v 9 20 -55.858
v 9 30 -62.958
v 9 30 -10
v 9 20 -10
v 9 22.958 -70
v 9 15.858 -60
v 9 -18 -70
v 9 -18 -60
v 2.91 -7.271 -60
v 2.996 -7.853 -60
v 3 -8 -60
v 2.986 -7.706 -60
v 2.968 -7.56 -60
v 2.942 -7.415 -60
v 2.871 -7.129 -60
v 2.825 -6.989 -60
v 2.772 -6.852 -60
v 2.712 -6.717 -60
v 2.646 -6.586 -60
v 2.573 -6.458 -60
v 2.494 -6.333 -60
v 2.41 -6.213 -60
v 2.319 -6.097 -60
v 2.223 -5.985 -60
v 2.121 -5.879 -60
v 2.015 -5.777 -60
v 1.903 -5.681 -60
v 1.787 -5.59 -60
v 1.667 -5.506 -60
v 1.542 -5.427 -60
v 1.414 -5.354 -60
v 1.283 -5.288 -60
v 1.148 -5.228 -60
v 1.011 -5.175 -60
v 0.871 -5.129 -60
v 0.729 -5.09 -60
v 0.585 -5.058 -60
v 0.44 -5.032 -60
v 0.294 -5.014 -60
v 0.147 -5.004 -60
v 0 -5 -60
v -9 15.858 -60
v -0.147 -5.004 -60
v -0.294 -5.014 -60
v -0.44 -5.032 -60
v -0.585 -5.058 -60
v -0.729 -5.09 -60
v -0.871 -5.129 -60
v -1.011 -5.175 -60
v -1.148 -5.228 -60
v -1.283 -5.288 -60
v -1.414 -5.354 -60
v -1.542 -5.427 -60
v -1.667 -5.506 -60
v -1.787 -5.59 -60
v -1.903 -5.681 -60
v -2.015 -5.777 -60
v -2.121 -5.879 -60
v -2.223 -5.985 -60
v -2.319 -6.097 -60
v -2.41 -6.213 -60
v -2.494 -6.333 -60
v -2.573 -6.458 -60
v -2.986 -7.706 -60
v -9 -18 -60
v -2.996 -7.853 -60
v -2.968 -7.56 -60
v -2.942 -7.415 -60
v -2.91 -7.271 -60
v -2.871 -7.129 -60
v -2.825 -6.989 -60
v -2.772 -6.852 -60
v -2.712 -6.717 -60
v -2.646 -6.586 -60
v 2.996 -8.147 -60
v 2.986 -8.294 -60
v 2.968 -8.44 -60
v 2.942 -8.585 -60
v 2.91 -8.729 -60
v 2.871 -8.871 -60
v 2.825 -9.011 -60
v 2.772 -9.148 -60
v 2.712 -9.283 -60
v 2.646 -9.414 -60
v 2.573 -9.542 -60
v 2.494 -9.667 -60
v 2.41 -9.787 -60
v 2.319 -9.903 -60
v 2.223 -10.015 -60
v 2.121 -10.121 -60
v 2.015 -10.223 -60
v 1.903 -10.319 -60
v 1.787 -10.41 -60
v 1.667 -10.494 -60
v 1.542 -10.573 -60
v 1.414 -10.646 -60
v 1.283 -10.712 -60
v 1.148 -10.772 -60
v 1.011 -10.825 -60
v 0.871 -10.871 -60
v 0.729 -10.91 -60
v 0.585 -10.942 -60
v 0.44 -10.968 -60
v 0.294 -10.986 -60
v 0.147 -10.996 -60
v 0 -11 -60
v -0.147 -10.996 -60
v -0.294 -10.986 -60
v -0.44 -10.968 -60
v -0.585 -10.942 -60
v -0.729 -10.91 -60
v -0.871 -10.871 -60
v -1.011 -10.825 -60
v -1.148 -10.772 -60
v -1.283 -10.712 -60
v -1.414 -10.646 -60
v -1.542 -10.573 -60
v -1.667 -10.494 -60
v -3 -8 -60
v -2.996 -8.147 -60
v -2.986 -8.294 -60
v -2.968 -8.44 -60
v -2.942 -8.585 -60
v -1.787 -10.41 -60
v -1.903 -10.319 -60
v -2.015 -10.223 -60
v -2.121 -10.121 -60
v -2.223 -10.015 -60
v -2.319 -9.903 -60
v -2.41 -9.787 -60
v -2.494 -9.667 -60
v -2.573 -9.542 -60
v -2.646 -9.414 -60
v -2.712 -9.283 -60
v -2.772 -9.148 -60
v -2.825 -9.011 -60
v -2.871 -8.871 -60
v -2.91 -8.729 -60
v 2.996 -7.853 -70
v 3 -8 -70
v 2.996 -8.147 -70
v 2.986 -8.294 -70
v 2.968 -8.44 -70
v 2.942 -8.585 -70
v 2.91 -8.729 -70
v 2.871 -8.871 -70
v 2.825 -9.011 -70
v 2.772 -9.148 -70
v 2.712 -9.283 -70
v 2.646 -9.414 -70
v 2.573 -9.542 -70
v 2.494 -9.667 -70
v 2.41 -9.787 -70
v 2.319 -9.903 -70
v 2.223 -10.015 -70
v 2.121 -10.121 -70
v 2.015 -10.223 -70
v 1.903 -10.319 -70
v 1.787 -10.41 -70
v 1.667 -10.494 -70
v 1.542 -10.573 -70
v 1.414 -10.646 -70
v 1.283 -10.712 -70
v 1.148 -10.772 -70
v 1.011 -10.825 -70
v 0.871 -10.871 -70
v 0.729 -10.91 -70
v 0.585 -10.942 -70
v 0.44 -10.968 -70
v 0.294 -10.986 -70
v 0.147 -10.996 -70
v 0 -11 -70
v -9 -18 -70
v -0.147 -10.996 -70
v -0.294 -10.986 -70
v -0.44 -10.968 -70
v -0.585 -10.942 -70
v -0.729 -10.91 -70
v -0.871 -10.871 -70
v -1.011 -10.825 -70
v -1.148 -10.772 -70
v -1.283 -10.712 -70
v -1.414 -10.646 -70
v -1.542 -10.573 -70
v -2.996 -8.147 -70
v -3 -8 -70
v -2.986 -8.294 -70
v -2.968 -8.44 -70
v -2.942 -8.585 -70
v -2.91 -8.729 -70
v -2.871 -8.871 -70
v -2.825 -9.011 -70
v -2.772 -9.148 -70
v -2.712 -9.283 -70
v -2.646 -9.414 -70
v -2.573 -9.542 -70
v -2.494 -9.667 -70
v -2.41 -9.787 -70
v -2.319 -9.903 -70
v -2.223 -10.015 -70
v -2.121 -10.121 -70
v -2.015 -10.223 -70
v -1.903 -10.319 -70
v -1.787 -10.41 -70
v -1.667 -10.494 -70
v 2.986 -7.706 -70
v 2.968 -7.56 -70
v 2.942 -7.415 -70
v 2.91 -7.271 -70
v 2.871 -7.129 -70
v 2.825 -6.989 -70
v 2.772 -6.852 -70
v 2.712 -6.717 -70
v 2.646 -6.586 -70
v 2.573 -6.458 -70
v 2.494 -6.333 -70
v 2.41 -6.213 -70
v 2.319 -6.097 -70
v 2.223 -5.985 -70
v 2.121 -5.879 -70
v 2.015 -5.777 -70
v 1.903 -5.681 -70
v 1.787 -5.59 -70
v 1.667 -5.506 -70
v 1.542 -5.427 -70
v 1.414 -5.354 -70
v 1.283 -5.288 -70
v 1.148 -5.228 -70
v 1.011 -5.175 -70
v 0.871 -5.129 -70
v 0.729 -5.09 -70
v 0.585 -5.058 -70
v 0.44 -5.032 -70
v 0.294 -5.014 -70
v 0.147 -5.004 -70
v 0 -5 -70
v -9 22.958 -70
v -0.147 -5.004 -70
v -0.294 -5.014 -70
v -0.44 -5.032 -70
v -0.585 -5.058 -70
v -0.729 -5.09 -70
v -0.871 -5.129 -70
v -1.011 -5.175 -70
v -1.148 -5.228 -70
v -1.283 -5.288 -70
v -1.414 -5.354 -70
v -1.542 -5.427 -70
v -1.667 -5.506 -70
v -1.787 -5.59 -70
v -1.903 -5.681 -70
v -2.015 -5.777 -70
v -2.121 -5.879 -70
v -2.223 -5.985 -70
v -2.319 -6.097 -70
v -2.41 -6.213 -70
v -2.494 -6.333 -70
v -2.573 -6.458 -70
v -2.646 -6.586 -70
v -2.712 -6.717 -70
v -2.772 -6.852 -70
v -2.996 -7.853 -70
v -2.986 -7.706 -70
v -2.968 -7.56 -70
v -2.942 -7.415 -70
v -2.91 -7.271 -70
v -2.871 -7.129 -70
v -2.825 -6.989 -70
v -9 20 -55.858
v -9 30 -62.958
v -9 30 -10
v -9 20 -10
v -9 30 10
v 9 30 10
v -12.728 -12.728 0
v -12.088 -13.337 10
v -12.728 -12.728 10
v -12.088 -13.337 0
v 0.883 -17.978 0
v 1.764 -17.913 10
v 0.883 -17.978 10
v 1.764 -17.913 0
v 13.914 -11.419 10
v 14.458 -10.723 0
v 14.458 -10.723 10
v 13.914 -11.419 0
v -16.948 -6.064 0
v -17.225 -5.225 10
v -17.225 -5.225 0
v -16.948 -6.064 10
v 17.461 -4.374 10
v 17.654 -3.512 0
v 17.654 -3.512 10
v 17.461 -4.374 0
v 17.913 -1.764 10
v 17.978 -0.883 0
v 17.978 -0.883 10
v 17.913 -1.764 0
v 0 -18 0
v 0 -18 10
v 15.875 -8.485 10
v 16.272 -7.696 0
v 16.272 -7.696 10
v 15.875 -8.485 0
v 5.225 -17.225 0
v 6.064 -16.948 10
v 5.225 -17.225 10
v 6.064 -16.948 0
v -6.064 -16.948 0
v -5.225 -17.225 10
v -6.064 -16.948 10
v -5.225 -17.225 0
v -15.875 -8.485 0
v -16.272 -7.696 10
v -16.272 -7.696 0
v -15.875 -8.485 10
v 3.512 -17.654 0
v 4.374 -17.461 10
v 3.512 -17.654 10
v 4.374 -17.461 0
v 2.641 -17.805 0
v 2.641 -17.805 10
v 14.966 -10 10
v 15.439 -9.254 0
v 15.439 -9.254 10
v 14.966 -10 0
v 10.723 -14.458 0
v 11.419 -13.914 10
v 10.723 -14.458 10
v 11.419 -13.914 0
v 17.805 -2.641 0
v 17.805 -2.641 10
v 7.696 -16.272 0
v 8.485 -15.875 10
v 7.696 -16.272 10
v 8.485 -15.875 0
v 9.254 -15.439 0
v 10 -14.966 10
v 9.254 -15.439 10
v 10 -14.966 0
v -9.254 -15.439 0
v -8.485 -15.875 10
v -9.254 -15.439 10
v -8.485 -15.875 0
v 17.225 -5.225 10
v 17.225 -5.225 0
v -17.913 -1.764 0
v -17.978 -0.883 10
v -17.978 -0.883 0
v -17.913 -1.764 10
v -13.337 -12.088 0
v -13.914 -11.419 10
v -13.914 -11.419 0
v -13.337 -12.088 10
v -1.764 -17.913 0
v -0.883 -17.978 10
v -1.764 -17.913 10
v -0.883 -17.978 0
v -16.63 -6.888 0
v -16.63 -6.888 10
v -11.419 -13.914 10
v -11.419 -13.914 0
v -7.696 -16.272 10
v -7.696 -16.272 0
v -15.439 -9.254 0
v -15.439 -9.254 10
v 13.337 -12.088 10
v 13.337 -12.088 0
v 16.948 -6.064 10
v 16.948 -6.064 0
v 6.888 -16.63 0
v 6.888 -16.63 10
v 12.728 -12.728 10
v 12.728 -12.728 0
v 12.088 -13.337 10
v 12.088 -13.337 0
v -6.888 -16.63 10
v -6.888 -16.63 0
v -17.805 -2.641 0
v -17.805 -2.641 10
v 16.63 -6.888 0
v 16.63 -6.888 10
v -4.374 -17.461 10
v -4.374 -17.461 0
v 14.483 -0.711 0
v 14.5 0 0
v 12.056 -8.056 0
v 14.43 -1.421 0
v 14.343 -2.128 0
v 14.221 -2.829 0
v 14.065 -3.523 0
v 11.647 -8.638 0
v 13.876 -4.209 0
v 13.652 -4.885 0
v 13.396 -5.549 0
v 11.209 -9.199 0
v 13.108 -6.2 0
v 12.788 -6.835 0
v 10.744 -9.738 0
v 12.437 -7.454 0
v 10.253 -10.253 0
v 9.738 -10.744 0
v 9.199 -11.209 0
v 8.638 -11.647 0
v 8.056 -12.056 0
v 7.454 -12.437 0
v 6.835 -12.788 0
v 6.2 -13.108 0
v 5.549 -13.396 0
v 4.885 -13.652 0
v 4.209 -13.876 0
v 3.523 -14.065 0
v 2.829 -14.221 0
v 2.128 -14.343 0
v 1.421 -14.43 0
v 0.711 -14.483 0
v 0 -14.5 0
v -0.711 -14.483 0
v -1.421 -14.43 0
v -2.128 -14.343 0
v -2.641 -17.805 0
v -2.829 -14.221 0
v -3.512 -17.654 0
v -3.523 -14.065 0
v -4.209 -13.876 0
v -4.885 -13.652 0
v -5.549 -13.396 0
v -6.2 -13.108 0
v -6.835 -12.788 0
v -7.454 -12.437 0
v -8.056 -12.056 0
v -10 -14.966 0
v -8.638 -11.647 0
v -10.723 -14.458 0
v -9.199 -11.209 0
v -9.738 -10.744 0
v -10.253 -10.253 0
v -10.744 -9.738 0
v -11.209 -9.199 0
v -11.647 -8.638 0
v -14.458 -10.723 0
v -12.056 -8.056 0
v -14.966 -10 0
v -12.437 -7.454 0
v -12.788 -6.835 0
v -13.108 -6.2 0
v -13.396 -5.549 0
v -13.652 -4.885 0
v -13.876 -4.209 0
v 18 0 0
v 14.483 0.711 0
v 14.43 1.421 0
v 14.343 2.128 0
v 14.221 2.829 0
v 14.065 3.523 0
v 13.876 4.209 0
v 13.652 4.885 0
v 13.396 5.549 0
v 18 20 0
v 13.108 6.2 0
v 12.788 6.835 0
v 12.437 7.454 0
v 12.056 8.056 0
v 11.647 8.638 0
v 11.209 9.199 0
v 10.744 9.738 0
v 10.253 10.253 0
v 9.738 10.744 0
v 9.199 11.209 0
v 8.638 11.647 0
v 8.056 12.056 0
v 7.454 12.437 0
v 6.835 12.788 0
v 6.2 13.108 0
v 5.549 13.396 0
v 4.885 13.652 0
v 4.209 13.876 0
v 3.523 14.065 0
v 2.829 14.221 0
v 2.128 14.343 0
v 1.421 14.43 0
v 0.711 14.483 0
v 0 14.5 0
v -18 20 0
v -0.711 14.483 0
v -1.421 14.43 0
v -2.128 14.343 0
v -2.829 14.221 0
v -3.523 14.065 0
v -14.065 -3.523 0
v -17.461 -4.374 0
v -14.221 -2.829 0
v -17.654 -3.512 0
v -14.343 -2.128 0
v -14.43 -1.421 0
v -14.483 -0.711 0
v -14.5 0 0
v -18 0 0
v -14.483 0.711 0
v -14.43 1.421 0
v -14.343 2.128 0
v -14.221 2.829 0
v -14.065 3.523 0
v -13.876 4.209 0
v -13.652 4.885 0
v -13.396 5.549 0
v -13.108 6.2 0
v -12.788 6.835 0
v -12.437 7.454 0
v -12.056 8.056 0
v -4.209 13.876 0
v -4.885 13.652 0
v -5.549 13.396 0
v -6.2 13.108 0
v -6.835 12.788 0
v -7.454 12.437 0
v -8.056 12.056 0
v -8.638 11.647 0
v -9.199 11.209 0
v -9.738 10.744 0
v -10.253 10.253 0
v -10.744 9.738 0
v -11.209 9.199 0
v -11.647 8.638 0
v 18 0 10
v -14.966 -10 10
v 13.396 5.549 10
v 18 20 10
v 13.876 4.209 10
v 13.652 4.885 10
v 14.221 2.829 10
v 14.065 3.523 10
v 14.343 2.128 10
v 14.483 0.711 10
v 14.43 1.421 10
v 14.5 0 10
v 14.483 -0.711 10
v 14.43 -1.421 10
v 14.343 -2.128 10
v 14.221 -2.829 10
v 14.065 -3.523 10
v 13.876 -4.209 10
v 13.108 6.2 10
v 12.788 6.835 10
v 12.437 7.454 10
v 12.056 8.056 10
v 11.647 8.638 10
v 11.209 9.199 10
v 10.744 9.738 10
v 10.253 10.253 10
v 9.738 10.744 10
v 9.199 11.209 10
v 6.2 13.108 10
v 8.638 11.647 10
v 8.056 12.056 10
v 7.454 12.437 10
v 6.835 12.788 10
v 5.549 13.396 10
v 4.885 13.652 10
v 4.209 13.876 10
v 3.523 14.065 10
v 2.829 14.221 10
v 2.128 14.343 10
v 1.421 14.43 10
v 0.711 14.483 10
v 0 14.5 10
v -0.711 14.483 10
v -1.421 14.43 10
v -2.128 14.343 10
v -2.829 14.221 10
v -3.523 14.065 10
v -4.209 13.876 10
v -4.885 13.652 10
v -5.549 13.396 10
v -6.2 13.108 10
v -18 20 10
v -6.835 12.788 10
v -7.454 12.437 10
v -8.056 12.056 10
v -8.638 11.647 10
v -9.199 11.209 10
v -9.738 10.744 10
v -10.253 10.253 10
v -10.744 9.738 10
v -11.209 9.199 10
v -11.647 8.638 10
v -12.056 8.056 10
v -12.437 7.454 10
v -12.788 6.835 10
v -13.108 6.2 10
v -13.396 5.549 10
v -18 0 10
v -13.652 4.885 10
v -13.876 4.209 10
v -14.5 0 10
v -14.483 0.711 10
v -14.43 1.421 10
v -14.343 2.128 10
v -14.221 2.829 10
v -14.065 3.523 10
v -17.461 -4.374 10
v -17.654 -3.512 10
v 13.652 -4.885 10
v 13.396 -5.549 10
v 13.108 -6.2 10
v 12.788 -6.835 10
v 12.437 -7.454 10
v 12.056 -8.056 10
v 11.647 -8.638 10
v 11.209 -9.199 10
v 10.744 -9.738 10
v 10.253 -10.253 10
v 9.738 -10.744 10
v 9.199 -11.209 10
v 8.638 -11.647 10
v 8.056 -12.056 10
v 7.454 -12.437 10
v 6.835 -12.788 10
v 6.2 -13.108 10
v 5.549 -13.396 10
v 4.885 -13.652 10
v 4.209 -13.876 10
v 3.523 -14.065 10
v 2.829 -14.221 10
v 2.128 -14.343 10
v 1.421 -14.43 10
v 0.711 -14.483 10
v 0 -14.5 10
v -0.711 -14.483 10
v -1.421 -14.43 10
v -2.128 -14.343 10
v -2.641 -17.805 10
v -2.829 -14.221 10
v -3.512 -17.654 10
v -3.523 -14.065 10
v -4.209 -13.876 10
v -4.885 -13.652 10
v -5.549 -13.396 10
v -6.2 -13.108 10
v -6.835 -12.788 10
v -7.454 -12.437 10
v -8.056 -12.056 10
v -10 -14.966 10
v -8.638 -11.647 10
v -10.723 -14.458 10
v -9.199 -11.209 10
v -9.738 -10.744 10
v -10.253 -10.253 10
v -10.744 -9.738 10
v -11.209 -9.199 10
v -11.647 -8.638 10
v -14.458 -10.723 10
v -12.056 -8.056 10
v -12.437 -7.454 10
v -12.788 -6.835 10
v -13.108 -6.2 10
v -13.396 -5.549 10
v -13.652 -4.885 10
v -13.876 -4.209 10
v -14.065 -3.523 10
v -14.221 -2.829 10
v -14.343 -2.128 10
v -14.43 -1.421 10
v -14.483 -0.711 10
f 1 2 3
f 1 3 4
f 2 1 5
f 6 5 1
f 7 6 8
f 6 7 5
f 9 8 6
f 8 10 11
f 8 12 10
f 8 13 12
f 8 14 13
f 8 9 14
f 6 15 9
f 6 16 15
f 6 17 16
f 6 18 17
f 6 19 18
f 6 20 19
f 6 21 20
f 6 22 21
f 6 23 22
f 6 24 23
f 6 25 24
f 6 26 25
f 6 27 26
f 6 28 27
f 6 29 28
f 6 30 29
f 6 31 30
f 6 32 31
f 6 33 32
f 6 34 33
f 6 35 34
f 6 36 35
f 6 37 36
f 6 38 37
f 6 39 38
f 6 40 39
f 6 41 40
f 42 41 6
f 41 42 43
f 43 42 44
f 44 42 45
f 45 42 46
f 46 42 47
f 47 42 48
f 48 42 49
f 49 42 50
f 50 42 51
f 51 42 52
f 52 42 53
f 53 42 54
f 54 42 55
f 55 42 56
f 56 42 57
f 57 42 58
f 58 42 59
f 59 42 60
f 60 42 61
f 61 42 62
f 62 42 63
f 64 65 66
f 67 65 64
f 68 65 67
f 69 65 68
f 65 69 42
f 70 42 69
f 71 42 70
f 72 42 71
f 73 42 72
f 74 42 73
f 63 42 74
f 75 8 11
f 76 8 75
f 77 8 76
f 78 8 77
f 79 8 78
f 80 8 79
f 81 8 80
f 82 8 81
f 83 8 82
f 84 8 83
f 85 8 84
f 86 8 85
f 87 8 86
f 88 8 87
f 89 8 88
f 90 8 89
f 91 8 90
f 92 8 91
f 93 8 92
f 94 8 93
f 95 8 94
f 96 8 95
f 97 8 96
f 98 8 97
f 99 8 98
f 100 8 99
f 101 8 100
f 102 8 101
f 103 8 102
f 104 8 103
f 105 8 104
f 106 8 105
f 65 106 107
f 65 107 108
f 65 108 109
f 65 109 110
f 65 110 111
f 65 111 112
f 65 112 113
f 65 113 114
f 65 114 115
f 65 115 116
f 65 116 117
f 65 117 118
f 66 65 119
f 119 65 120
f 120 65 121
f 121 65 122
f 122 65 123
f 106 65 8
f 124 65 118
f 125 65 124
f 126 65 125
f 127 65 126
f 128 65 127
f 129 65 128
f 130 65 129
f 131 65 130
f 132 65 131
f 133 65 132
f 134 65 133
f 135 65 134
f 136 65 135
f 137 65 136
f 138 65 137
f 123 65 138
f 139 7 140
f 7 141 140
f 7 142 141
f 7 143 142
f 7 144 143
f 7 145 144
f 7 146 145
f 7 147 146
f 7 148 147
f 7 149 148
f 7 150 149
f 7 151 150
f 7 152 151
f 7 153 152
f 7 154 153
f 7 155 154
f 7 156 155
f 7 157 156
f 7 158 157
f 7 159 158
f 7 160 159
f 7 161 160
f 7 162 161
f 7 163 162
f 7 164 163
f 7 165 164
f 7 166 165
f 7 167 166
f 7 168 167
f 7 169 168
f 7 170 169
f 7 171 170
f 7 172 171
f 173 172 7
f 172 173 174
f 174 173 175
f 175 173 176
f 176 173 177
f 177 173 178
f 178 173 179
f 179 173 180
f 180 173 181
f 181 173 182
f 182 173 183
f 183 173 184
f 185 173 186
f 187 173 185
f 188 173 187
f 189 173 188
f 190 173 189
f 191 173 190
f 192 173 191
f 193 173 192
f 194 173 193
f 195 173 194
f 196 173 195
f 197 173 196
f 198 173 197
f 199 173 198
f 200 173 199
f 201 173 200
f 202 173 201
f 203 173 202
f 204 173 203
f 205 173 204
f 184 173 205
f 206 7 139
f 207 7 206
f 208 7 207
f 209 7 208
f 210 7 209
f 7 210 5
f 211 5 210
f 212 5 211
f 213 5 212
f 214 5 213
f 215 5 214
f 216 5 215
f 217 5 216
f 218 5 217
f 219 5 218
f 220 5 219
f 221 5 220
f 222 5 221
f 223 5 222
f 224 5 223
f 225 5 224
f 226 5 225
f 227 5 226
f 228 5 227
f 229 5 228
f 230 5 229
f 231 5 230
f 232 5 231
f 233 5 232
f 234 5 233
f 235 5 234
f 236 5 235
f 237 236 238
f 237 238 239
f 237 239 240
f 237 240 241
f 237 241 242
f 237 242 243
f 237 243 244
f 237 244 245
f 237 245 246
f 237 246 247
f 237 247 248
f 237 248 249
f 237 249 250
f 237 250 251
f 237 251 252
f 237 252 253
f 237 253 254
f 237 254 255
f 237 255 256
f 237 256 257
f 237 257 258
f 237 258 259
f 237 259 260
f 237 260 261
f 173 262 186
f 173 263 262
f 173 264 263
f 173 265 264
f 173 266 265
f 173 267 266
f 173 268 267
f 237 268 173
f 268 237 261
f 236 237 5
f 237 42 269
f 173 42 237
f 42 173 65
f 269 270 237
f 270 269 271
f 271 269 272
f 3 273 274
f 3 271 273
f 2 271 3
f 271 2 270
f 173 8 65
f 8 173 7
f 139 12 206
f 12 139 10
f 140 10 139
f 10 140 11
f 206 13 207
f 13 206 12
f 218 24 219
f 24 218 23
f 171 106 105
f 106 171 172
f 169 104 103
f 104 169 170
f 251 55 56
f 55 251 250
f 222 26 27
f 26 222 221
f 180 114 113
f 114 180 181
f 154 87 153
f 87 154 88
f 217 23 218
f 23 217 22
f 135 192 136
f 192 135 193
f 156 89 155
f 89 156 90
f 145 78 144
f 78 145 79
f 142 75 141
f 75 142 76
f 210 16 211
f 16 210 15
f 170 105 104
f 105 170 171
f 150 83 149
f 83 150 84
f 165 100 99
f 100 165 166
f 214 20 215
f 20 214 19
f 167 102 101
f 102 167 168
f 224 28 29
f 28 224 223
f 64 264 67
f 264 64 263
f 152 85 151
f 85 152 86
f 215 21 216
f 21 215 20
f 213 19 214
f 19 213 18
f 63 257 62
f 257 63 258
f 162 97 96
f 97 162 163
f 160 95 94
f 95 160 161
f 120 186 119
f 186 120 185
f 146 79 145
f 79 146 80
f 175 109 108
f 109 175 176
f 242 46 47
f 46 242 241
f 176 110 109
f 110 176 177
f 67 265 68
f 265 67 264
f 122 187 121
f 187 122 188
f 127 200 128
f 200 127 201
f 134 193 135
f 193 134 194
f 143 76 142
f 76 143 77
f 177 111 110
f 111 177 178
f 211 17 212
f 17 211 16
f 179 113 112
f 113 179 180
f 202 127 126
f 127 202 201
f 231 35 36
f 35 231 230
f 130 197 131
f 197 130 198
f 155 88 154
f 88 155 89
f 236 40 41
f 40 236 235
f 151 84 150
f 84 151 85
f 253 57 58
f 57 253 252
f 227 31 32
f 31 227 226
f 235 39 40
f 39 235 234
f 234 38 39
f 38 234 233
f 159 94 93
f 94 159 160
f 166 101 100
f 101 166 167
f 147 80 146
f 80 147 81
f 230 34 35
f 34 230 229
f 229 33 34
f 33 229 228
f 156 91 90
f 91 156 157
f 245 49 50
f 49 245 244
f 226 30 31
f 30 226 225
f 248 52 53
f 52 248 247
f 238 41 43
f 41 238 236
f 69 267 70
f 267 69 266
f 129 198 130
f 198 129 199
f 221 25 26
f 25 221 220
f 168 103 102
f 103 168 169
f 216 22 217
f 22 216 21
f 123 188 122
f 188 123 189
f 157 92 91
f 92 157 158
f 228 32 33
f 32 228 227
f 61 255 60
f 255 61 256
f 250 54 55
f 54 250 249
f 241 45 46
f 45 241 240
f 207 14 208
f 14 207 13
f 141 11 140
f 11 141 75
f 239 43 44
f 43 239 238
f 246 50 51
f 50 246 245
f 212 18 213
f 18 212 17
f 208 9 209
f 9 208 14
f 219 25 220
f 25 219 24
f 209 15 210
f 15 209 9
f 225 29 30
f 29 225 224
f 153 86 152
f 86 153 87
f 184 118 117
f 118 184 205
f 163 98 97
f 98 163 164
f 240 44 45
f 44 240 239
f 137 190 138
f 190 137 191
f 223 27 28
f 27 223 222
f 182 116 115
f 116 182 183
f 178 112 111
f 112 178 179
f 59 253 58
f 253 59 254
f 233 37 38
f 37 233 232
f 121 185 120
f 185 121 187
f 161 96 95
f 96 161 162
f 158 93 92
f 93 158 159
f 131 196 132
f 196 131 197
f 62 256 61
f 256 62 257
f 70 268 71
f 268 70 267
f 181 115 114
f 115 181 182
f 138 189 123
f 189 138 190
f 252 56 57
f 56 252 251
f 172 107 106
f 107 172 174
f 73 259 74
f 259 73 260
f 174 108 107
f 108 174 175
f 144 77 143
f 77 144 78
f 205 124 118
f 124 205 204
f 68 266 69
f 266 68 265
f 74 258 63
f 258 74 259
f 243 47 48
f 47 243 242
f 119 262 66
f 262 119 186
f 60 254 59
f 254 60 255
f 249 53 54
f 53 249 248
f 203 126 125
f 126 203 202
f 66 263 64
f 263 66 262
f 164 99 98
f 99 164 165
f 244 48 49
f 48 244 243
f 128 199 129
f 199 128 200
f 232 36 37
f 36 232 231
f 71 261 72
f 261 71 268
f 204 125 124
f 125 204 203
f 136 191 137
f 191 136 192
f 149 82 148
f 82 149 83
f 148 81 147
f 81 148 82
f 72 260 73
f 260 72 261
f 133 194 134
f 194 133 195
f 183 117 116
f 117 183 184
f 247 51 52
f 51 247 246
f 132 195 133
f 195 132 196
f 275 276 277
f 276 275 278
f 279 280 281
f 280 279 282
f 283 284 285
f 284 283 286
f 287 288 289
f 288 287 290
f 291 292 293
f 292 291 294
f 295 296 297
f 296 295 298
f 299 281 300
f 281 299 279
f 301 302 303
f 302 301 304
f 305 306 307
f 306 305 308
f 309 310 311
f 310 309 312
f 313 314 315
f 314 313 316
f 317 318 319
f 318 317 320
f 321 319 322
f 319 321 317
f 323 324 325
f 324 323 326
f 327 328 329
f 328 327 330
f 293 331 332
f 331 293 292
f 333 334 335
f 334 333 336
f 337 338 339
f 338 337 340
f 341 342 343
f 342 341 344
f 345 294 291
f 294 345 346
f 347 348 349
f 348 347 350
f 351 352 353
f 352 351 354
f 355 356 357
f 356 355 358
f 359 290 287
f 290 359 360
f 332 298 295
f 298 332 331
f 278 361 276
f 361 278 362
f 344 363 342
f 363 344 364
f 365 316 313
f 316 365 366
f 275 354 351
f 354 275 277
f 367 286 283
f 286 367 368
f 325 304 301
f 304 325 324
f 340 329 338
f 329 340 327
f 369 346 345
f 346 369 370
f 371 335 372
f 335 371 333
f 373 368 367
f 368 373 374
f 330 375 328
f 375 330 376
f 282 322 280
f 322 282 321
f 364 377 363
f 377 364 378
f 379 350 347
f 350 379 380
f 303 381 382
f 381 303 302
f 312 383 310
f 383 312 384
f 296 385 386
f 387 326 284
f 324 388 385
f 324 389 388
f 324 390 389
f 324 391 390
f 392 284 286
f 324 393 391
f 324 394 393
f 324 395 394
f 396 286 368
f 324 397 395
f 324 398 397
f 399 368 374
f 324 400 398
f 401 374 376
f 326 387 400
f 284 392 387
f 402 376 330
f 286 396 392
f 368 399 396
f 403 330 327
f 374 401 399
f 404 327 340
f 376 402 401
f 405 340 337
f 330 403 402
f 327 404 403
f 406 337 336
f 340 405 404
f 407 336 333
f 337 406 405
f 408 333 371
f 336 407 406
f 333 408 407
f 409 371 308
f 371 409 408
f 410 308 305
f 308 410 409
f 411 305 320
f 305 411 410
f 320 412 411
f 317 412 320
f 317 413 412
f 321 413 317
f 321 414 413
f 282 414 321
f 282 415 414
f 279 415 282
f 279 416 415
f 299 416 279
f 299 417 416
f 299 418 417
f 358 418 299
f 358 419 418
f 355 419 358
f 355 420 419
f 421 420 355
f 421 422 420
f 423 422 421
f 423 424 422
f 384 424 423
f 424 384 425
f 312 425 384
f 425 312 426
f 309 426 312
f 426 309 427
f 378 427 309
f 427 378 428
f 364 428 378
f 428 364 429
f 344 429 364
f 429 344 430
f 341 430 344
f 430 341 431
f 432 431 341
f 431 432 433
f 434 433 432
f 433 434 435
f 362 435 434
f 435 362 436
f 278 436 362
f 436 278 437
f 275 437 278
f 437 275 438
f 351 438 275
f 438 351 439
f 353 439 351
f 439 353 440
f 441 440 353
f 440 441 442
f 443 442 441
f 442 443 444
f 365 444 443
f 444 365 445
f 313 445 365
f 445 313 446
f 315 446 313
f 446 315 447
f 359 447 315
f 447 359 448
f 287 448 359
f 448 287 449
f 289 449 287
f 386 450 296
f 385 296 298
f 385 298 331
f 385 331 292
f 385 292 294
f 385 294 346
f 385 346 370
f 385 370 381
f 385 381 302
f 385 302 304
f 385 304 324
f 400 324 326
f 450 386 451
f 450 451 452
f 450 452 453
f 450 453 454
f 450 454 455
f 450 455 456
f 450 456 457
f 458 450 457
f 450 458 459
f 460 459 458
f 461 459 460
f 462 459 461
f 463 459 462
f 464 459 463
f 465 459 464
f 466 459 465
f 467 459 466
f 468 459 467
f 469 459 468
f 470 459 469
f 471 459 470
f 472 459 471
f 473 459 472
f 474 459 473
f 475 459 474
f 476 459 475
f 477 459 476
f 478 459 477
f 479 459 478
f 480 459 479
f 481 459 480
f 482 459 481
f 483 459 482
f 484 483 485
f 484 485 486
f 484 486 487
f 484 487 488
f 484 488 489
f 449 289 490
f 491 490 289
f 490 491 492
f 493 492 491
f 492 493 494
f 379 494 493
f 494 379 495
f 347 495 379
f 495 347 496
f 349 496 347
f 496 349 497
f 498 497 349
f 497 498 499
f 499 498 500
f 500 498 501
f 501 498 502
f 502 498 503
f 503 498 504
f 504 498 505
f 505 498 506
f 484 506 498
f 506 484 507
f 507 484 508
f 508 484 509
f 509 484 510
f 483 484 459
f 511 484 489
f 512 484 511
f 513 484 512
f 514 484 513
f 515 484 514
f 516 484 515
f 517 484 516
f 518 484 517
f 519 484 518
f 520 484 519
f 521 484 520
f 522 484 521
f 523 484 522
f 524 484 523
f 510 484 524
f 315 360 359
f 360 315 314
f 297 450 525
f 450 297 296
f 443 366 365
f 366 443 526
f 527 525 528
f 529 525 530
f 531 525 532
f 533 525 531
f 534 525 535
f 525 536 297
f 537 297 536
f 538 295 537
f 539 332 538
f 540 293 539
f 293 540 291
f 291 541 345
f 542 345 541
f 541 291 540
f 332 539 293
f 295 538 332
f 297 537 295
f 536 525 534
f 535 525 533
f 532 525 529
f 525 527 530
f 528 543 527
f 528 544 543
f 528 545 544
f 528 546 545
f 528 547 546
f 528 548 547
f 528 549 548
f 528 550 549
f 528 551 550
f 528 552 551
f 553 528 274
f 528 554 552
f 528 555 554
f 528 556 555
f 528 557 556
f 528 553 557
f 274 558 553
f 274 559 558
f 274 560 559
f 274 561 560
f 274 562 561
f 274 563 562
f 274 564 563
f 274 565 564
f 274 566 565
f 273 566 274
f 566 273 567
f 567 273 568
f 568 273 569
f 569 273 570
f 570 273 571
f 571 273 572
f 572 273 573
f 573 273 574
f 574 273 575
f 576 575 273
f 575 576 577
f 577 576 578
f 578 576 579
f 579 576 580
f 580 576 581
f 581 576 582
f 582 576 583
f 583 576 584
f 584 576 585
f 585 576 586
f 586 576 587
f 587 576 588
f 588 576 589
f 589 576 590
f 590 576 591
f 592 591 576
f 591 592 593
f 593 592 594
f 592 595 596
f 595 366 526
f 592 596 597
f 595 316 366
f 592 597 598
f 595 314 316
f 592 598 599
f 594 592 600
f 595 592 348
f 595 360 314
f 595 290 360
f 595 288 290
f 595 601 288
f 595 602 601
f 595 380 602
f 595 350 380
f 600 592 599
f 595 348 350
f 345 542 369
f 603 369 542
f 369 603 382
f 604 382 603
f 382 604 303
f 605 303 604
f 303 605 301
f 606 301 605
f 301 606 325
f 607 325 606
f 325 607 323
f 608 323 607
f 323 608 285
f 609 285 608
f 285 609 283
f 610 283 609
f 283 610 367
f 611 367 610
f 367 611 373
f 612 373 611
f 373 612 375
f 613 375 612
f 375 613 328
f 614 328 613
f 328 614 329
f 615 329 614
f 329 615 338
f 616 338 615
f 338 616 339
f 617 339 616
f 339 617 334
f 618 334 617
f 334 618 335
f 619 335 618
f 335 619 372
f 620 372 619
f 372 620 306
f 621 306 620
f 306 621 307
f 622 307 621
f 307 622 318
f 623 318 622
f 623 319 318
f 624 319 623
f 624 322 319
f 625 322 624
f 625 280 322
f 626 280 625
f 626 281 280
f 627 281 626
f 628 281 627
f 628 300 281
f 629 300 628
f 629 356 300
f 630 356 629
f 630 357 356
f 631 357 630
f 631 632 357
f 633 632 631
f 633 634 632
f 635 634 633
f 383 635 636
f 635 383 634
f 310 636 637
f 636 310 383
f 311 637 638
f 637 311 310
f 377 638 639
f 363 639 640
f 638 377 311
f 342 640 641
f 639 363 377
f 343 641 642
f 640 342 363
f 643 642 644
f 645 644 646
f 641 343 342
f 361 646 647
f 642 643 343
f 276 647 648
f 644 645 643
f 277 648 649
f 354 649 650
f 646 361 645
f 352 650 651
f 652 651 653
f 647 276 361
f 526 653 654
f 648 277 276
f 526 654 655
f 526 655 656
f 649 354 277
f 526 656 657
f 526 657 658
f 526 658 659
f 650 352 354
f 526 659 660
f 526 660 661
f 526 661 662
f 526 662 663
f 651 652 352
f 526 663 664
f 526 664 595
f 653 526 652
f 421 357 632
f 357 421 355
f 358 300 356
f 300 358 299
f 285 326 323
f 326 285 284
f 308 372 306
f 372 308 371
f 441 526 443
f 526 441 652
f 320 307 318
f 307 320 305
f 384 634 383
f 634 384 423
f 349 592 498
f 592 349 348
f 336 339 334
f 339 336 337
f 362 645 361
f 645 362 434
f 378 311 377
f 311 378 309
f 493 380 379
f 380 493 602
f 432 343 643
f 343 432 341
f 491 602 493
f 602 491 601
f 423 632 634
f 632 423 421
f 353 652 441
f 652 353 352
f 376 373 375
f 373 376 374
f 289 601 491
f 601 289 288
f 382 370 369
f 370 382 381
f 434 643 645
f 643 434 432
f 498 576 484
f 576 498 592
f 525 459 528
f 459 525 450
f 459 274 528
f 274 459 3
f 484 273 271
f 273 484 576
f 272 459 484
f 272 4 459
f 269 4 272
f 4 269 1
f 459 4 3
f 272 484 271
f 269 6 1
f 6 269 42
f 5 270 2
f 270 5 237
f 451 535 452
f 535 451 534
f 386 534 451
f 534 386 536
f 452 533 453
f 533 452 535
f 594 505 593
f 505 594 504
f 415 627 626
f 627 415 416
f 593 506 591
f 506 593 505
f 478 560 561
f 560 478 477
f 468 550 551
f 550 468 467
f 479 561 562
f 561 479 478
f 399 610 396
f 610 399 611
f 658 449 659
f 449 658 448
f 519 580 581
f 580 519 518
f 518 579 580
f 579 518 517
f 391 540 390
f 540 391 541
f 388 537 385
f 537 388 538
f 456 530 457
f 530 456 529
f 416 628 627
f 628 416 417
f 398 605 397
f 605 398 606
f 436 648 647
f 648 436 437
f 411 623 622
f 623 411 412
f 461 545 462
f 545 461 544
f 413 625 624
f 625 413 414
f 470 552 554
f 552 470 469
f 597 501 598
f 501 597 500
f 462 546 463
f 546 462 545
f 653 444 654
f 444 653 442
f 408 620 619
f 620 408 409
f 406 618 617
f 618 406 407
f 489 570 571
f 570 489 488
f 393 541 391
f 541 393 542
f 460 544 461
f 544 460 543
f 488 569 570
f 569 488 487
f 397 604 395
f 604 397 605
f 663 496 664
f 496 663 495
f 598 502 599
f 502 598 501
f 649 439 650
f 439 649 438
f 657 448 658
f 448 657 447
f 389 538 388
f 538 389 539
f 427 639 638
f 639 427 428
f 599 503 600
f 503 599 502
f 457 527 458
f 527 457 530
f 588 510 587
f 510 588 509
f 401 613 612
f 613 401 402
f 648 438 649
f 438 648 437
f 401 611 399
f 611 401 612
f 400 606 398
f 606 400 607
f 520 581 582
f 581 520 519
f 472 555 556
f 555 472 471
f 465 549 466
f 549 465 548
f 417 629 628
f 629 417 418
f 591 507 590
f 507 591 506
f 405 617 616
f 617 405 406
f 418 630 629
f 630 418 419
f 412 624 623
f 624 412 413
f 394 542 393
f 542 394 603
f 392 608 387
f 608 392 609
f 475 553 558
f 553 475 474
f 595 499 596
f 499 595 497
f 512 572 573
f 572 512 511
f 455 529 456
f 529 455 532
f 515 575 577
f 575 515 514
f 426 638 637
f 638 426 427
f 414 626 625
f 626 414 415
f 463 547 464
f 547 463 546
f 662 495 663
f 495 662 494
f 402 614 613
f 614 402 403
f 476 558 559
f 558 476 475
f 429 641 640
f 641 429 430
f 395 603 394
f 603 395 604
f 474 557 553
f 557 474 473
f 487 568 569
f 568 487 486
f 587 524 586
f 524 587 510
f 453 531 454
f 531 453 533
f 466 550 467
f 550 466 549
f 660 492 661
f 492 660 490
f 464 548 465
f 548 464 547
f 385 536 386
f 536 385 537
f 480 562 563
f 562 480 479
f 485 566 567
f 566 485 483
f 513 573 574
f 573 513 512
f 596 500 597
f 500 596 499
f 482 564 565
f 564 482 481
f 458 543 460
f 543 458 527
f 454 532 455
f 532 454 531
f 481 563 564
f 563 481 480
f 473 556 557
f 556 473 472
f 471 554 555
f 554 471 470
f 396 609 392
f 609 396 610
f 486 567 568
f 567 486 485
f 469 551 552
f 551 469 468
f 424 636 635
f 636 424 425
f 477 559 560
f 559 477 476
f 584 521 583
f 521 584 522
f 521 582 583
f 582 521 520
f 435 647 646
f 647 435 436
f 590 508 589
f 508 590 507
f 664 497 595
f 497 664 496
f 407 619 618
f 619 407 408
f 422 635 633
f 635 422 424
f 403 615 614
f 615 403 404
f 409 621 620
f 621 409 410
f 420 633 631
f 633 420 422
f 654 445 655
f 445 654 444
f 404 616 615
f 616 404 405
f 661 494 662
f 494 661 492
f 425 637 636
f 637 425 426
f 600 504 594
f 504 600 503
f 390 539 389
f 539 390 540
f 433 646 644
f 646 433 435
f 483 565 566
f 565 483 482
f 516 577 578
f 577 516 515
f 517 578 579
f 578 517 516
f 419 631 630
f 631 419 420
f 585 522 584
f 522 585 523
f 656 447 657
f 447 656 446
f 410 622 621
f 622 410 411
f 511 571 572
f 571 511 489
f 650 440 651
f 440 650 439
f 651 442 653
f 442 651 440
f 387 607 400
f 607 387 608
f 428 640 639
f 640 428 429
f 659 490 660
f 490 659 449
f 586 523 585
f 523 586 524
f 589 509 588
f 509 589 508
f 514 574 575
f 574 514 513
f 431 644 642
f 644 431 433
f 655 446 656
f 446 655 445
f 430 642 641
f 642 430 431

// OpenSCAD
// Generated by SolidPython 1.1.3 on 2024-03-23 22:13:12
$fn = 128;


difference(){
	difference() {
		union() {
			difference() {
				cylinder(h = 10, r = 18.0000000000);
			}
			hull() {
				translate(v = [-18.0000000000, 0, 0]) {
					cube(size = [36, 20.0000000000, 10]);
				}
				hull() {
					translate(v = [0, 0, 0]) {
						translate(v = [0, 20.0000000000, 0]) {
							translate(v = [-9.0000000000, 0, 0]) {
								cube(size = [18.0000000000, 10, 10]);
							}
						}
					}
				}
			}
			translate(v = [0, 0, -60]) {
				translate(v = [0, 20.0000000000, 0]) {
					translate(v = [-9.0000000000, 0, 0]) {
						cube(size = [18.0000000000, 10, 70]);
					}
				}
			}
			translate(v = [0, -18, 0]) {
				translate(v = [-9.0000000000, 0, 0]) {
					translate(v = [0, 0, -70]) {
						difference() {
							cube(size = [18.0000000000, 48, 10]);
							translate(v = [0, 10, 0]) {
								translate(v = [9.0000000000, 0, 0]) {
									cylinder(h = 10, r = 3);
								}
							}
						}
					}
				}
			}
			hull() {
				intersection() {
					translate(v = [-18.0000000000, 0, 0]) {
						translate(v = [0, 20.0000000000, 0]) {
							cube(size = [36, 10, 10]);
						}
					}
					union() {
						difference() {
							cylinder(h = 10, r = 18.0000000000);
						}
						hull() {
							translate(v = [-18.0000000000, 0, 0]) {
								cube(size = [36, 20.0000000000, 10]);
							}
							hull() {
								translate(v = [0, 0, 0]) {
									translate(v = [0, 20.0000000000, 0]) {
										translate(v = [-9.0000000000, 0, 0]) {
											cube(size = [18.0000000000, 10, 10]);
										}
									}
								}
							}
						}
						translate(v = [0, 0, -60]) {
							translate(v = [0, 20.0000000000, 0]) {
								translate(v = [-9.0000000000, 0, 0]) {
									cube(size = [18.0000000000, 10, 70]);
								}
							}
						}
						translate(v = [0, -18, 0]) {
							translate(v = [-9.0000000000, 0, 0]) {
								translate(v = [0, 0, -70]) {
									difference() {
										cube(size = [18.0000000000, 48, 10]);
										translate(v = [0, 10, 0]) {
											translate(v = [9.0000000000, 0, 0]) {
												cylinder(h = 10, r = 3);
											}
										}
									}
								}
							}
						}
					}
				}
				translate(v = [0, 0, -10]) {
					translate(v = [0, 0, 0]) {
						translate(v = [0, 20.0000000000, 0]) {
							translate(v = [-9.0000000000, 0, 0]) {
								cube(size = [18.0000000000, 10, 10]);
							}
						}
					}
				}
			}
			translate(v = [0, 20, 0]) {
				translate(v = [-9, 0, 0]) {
					translate(v = [0, 0, -70]) {
						rotate(a = 45, v = [1, 0, 0]) {
							cube(size = [18, 10, 10]);
						}
					}
				}
			}
		}
		translate(v = [0, 30, 0]) {
			translate(v = [-9, 0, 0]) {
				translate(v = [0, 0, -77.1000000000]) {
					rotate(a = 45, v = [1, 0, 0]) {
						cube(size = [30, 10, 10]);
					}
				}
			}
		}
	}
	/* Holes Below*/
	union(){
		union(){
			union(){
				cylinder(h = 10, r = 14.5000000000);
			}
			hull(){
				union(){
					union(){
						union(){
							cylinder(h = 10, r = 14.5000000000);
						}
					}
				}
			}
		}
	} /* End Holes */ 
}
/***********************************************
*********      SolidPython code:      **********
************************************************
 
from dataclasses import dataclass

from solid import cylinder, scad_render_to_file, hole, cube, rotate, translate, hull, sphere, mirror, square, intersection
from solid.utils import left, right, forward, back, up, down, BACK_VEC, FORWARD_VEC, fillet_2d


@dataclass
class Ring:
    innerd: int = 29
    thick: int = 5
    height: int = 10

    @property
    def outerd(self):
        return self.innerd + self.thick

    def obj(self):
        outer = cylinder(r=self.outerd/2, h=self.height)
        inner = cylinder(r=self.innerd/2, h=self.height)
        return outer - hole()(inner)


@dataclass
class UpperBody:
    clearance: int = 2
    thick: int = 10
    width: int = 34

    @property
    def length(self):
        return self.width/2 + self.clearance

    def pos(self, obj):
        return left(self.width/2)(obj)

    def obj(self):
        return self.pos(cube([self.width, self.length, self.thick]))


@dataclass
class Spine:
    height: int = 70
    width: int = 34
    thick: int = 10
    um_length: int = 50
    um_thick: int = 10

    def _obj(self):
        return cube([self.width, self.thick, self.height])

    def pos(self, obj):
        return down(self.height - self.um_thick)(forward(self.um_length)(left(self.width/2)(obj)))

    def obj(self):
        return self.pos(self._obj())


@dataclass
class SpineConnector:
    width: int = 34
    thick: int = 10
    um_length: int = 50
    um_thick: int = 10

    @property
    def height(self):
        return self.um_thick

    def _obj(self):
        return cube([self.width, self.thick, self.um_thick])

    def pos(self, obj):
        return down(self.height - self.um_thick)(forward(self.um_length)(left(self.width/2)(obj)))

    def obj(self):
        return self.pos(self._obj())


@dataclass
class LowerBody:
    length: int = 38
    width: int = 34
    thick: int = 10
    spine_height: int = 70
    spine_thick: int = 10
    um_length: int = 10
    hole_offset: int = 10

    def _obj(self):
        return (
            cube([self.width, self.length + self.spine_thick, self.thick]) -
            forward(self.hole_offset)(right(self.width/2)(cylinder(r=3, h=self.thick)))
        )

    def pos(self, obj):
        # fucked up here, eyeball it
        return back(18)(left(self.width/2)(down(self.spine_height)(obj)))

    def obj(self):
        return self.pos(self._obj())


ring = Ring(thick=7)
um = UpperBody(thick=ring.height, width=ring.outerd)
spine = Spine(width=ring.outerd/2, um_length=um.length, um_thick=um.thick)
spine_connector = SpineConnector(width=ring.outerd/2, um_length=um.length, um_thick=um.thick)
lb = LowerBody(width=ring.outerd/2, spine_height=spine.height, spine_thick=spine.thick)

main = sum([
    ring.obj(),
    hull()(
        um.obj(),
        hull()(
            spine_connector.obj(),
        )
    ),
    spine.obj(),
    lb.obj()
])

# beef up the spine connector with a chamfer underneath
beef = hull()(
    intersection()(left(ring.outerd/2)(forward(um.length)((cube([ring.outerd, spine_connector.thick, um.thick])))), main),
    down(spine_connector.height)(spine_connector.obj())
)

# add chamfers to the bottom joint
# annnnd here is where I give up on trying to be neat
chamfer_box = forward(20)(left(9)(down(70)(rotate(45, [1,0,0])(cube([18,10,10])))))
chamfer_box2 = forward(30)(left(9)(down(77.1)(rotate(45, [1,0,0])(cube([30,10,10])))))


scad_render_to_file((main + beef + chamfer_box) - chamfer_box2, 'test.scad', file_header='$fn = 128;')
 
 
************************************************/
